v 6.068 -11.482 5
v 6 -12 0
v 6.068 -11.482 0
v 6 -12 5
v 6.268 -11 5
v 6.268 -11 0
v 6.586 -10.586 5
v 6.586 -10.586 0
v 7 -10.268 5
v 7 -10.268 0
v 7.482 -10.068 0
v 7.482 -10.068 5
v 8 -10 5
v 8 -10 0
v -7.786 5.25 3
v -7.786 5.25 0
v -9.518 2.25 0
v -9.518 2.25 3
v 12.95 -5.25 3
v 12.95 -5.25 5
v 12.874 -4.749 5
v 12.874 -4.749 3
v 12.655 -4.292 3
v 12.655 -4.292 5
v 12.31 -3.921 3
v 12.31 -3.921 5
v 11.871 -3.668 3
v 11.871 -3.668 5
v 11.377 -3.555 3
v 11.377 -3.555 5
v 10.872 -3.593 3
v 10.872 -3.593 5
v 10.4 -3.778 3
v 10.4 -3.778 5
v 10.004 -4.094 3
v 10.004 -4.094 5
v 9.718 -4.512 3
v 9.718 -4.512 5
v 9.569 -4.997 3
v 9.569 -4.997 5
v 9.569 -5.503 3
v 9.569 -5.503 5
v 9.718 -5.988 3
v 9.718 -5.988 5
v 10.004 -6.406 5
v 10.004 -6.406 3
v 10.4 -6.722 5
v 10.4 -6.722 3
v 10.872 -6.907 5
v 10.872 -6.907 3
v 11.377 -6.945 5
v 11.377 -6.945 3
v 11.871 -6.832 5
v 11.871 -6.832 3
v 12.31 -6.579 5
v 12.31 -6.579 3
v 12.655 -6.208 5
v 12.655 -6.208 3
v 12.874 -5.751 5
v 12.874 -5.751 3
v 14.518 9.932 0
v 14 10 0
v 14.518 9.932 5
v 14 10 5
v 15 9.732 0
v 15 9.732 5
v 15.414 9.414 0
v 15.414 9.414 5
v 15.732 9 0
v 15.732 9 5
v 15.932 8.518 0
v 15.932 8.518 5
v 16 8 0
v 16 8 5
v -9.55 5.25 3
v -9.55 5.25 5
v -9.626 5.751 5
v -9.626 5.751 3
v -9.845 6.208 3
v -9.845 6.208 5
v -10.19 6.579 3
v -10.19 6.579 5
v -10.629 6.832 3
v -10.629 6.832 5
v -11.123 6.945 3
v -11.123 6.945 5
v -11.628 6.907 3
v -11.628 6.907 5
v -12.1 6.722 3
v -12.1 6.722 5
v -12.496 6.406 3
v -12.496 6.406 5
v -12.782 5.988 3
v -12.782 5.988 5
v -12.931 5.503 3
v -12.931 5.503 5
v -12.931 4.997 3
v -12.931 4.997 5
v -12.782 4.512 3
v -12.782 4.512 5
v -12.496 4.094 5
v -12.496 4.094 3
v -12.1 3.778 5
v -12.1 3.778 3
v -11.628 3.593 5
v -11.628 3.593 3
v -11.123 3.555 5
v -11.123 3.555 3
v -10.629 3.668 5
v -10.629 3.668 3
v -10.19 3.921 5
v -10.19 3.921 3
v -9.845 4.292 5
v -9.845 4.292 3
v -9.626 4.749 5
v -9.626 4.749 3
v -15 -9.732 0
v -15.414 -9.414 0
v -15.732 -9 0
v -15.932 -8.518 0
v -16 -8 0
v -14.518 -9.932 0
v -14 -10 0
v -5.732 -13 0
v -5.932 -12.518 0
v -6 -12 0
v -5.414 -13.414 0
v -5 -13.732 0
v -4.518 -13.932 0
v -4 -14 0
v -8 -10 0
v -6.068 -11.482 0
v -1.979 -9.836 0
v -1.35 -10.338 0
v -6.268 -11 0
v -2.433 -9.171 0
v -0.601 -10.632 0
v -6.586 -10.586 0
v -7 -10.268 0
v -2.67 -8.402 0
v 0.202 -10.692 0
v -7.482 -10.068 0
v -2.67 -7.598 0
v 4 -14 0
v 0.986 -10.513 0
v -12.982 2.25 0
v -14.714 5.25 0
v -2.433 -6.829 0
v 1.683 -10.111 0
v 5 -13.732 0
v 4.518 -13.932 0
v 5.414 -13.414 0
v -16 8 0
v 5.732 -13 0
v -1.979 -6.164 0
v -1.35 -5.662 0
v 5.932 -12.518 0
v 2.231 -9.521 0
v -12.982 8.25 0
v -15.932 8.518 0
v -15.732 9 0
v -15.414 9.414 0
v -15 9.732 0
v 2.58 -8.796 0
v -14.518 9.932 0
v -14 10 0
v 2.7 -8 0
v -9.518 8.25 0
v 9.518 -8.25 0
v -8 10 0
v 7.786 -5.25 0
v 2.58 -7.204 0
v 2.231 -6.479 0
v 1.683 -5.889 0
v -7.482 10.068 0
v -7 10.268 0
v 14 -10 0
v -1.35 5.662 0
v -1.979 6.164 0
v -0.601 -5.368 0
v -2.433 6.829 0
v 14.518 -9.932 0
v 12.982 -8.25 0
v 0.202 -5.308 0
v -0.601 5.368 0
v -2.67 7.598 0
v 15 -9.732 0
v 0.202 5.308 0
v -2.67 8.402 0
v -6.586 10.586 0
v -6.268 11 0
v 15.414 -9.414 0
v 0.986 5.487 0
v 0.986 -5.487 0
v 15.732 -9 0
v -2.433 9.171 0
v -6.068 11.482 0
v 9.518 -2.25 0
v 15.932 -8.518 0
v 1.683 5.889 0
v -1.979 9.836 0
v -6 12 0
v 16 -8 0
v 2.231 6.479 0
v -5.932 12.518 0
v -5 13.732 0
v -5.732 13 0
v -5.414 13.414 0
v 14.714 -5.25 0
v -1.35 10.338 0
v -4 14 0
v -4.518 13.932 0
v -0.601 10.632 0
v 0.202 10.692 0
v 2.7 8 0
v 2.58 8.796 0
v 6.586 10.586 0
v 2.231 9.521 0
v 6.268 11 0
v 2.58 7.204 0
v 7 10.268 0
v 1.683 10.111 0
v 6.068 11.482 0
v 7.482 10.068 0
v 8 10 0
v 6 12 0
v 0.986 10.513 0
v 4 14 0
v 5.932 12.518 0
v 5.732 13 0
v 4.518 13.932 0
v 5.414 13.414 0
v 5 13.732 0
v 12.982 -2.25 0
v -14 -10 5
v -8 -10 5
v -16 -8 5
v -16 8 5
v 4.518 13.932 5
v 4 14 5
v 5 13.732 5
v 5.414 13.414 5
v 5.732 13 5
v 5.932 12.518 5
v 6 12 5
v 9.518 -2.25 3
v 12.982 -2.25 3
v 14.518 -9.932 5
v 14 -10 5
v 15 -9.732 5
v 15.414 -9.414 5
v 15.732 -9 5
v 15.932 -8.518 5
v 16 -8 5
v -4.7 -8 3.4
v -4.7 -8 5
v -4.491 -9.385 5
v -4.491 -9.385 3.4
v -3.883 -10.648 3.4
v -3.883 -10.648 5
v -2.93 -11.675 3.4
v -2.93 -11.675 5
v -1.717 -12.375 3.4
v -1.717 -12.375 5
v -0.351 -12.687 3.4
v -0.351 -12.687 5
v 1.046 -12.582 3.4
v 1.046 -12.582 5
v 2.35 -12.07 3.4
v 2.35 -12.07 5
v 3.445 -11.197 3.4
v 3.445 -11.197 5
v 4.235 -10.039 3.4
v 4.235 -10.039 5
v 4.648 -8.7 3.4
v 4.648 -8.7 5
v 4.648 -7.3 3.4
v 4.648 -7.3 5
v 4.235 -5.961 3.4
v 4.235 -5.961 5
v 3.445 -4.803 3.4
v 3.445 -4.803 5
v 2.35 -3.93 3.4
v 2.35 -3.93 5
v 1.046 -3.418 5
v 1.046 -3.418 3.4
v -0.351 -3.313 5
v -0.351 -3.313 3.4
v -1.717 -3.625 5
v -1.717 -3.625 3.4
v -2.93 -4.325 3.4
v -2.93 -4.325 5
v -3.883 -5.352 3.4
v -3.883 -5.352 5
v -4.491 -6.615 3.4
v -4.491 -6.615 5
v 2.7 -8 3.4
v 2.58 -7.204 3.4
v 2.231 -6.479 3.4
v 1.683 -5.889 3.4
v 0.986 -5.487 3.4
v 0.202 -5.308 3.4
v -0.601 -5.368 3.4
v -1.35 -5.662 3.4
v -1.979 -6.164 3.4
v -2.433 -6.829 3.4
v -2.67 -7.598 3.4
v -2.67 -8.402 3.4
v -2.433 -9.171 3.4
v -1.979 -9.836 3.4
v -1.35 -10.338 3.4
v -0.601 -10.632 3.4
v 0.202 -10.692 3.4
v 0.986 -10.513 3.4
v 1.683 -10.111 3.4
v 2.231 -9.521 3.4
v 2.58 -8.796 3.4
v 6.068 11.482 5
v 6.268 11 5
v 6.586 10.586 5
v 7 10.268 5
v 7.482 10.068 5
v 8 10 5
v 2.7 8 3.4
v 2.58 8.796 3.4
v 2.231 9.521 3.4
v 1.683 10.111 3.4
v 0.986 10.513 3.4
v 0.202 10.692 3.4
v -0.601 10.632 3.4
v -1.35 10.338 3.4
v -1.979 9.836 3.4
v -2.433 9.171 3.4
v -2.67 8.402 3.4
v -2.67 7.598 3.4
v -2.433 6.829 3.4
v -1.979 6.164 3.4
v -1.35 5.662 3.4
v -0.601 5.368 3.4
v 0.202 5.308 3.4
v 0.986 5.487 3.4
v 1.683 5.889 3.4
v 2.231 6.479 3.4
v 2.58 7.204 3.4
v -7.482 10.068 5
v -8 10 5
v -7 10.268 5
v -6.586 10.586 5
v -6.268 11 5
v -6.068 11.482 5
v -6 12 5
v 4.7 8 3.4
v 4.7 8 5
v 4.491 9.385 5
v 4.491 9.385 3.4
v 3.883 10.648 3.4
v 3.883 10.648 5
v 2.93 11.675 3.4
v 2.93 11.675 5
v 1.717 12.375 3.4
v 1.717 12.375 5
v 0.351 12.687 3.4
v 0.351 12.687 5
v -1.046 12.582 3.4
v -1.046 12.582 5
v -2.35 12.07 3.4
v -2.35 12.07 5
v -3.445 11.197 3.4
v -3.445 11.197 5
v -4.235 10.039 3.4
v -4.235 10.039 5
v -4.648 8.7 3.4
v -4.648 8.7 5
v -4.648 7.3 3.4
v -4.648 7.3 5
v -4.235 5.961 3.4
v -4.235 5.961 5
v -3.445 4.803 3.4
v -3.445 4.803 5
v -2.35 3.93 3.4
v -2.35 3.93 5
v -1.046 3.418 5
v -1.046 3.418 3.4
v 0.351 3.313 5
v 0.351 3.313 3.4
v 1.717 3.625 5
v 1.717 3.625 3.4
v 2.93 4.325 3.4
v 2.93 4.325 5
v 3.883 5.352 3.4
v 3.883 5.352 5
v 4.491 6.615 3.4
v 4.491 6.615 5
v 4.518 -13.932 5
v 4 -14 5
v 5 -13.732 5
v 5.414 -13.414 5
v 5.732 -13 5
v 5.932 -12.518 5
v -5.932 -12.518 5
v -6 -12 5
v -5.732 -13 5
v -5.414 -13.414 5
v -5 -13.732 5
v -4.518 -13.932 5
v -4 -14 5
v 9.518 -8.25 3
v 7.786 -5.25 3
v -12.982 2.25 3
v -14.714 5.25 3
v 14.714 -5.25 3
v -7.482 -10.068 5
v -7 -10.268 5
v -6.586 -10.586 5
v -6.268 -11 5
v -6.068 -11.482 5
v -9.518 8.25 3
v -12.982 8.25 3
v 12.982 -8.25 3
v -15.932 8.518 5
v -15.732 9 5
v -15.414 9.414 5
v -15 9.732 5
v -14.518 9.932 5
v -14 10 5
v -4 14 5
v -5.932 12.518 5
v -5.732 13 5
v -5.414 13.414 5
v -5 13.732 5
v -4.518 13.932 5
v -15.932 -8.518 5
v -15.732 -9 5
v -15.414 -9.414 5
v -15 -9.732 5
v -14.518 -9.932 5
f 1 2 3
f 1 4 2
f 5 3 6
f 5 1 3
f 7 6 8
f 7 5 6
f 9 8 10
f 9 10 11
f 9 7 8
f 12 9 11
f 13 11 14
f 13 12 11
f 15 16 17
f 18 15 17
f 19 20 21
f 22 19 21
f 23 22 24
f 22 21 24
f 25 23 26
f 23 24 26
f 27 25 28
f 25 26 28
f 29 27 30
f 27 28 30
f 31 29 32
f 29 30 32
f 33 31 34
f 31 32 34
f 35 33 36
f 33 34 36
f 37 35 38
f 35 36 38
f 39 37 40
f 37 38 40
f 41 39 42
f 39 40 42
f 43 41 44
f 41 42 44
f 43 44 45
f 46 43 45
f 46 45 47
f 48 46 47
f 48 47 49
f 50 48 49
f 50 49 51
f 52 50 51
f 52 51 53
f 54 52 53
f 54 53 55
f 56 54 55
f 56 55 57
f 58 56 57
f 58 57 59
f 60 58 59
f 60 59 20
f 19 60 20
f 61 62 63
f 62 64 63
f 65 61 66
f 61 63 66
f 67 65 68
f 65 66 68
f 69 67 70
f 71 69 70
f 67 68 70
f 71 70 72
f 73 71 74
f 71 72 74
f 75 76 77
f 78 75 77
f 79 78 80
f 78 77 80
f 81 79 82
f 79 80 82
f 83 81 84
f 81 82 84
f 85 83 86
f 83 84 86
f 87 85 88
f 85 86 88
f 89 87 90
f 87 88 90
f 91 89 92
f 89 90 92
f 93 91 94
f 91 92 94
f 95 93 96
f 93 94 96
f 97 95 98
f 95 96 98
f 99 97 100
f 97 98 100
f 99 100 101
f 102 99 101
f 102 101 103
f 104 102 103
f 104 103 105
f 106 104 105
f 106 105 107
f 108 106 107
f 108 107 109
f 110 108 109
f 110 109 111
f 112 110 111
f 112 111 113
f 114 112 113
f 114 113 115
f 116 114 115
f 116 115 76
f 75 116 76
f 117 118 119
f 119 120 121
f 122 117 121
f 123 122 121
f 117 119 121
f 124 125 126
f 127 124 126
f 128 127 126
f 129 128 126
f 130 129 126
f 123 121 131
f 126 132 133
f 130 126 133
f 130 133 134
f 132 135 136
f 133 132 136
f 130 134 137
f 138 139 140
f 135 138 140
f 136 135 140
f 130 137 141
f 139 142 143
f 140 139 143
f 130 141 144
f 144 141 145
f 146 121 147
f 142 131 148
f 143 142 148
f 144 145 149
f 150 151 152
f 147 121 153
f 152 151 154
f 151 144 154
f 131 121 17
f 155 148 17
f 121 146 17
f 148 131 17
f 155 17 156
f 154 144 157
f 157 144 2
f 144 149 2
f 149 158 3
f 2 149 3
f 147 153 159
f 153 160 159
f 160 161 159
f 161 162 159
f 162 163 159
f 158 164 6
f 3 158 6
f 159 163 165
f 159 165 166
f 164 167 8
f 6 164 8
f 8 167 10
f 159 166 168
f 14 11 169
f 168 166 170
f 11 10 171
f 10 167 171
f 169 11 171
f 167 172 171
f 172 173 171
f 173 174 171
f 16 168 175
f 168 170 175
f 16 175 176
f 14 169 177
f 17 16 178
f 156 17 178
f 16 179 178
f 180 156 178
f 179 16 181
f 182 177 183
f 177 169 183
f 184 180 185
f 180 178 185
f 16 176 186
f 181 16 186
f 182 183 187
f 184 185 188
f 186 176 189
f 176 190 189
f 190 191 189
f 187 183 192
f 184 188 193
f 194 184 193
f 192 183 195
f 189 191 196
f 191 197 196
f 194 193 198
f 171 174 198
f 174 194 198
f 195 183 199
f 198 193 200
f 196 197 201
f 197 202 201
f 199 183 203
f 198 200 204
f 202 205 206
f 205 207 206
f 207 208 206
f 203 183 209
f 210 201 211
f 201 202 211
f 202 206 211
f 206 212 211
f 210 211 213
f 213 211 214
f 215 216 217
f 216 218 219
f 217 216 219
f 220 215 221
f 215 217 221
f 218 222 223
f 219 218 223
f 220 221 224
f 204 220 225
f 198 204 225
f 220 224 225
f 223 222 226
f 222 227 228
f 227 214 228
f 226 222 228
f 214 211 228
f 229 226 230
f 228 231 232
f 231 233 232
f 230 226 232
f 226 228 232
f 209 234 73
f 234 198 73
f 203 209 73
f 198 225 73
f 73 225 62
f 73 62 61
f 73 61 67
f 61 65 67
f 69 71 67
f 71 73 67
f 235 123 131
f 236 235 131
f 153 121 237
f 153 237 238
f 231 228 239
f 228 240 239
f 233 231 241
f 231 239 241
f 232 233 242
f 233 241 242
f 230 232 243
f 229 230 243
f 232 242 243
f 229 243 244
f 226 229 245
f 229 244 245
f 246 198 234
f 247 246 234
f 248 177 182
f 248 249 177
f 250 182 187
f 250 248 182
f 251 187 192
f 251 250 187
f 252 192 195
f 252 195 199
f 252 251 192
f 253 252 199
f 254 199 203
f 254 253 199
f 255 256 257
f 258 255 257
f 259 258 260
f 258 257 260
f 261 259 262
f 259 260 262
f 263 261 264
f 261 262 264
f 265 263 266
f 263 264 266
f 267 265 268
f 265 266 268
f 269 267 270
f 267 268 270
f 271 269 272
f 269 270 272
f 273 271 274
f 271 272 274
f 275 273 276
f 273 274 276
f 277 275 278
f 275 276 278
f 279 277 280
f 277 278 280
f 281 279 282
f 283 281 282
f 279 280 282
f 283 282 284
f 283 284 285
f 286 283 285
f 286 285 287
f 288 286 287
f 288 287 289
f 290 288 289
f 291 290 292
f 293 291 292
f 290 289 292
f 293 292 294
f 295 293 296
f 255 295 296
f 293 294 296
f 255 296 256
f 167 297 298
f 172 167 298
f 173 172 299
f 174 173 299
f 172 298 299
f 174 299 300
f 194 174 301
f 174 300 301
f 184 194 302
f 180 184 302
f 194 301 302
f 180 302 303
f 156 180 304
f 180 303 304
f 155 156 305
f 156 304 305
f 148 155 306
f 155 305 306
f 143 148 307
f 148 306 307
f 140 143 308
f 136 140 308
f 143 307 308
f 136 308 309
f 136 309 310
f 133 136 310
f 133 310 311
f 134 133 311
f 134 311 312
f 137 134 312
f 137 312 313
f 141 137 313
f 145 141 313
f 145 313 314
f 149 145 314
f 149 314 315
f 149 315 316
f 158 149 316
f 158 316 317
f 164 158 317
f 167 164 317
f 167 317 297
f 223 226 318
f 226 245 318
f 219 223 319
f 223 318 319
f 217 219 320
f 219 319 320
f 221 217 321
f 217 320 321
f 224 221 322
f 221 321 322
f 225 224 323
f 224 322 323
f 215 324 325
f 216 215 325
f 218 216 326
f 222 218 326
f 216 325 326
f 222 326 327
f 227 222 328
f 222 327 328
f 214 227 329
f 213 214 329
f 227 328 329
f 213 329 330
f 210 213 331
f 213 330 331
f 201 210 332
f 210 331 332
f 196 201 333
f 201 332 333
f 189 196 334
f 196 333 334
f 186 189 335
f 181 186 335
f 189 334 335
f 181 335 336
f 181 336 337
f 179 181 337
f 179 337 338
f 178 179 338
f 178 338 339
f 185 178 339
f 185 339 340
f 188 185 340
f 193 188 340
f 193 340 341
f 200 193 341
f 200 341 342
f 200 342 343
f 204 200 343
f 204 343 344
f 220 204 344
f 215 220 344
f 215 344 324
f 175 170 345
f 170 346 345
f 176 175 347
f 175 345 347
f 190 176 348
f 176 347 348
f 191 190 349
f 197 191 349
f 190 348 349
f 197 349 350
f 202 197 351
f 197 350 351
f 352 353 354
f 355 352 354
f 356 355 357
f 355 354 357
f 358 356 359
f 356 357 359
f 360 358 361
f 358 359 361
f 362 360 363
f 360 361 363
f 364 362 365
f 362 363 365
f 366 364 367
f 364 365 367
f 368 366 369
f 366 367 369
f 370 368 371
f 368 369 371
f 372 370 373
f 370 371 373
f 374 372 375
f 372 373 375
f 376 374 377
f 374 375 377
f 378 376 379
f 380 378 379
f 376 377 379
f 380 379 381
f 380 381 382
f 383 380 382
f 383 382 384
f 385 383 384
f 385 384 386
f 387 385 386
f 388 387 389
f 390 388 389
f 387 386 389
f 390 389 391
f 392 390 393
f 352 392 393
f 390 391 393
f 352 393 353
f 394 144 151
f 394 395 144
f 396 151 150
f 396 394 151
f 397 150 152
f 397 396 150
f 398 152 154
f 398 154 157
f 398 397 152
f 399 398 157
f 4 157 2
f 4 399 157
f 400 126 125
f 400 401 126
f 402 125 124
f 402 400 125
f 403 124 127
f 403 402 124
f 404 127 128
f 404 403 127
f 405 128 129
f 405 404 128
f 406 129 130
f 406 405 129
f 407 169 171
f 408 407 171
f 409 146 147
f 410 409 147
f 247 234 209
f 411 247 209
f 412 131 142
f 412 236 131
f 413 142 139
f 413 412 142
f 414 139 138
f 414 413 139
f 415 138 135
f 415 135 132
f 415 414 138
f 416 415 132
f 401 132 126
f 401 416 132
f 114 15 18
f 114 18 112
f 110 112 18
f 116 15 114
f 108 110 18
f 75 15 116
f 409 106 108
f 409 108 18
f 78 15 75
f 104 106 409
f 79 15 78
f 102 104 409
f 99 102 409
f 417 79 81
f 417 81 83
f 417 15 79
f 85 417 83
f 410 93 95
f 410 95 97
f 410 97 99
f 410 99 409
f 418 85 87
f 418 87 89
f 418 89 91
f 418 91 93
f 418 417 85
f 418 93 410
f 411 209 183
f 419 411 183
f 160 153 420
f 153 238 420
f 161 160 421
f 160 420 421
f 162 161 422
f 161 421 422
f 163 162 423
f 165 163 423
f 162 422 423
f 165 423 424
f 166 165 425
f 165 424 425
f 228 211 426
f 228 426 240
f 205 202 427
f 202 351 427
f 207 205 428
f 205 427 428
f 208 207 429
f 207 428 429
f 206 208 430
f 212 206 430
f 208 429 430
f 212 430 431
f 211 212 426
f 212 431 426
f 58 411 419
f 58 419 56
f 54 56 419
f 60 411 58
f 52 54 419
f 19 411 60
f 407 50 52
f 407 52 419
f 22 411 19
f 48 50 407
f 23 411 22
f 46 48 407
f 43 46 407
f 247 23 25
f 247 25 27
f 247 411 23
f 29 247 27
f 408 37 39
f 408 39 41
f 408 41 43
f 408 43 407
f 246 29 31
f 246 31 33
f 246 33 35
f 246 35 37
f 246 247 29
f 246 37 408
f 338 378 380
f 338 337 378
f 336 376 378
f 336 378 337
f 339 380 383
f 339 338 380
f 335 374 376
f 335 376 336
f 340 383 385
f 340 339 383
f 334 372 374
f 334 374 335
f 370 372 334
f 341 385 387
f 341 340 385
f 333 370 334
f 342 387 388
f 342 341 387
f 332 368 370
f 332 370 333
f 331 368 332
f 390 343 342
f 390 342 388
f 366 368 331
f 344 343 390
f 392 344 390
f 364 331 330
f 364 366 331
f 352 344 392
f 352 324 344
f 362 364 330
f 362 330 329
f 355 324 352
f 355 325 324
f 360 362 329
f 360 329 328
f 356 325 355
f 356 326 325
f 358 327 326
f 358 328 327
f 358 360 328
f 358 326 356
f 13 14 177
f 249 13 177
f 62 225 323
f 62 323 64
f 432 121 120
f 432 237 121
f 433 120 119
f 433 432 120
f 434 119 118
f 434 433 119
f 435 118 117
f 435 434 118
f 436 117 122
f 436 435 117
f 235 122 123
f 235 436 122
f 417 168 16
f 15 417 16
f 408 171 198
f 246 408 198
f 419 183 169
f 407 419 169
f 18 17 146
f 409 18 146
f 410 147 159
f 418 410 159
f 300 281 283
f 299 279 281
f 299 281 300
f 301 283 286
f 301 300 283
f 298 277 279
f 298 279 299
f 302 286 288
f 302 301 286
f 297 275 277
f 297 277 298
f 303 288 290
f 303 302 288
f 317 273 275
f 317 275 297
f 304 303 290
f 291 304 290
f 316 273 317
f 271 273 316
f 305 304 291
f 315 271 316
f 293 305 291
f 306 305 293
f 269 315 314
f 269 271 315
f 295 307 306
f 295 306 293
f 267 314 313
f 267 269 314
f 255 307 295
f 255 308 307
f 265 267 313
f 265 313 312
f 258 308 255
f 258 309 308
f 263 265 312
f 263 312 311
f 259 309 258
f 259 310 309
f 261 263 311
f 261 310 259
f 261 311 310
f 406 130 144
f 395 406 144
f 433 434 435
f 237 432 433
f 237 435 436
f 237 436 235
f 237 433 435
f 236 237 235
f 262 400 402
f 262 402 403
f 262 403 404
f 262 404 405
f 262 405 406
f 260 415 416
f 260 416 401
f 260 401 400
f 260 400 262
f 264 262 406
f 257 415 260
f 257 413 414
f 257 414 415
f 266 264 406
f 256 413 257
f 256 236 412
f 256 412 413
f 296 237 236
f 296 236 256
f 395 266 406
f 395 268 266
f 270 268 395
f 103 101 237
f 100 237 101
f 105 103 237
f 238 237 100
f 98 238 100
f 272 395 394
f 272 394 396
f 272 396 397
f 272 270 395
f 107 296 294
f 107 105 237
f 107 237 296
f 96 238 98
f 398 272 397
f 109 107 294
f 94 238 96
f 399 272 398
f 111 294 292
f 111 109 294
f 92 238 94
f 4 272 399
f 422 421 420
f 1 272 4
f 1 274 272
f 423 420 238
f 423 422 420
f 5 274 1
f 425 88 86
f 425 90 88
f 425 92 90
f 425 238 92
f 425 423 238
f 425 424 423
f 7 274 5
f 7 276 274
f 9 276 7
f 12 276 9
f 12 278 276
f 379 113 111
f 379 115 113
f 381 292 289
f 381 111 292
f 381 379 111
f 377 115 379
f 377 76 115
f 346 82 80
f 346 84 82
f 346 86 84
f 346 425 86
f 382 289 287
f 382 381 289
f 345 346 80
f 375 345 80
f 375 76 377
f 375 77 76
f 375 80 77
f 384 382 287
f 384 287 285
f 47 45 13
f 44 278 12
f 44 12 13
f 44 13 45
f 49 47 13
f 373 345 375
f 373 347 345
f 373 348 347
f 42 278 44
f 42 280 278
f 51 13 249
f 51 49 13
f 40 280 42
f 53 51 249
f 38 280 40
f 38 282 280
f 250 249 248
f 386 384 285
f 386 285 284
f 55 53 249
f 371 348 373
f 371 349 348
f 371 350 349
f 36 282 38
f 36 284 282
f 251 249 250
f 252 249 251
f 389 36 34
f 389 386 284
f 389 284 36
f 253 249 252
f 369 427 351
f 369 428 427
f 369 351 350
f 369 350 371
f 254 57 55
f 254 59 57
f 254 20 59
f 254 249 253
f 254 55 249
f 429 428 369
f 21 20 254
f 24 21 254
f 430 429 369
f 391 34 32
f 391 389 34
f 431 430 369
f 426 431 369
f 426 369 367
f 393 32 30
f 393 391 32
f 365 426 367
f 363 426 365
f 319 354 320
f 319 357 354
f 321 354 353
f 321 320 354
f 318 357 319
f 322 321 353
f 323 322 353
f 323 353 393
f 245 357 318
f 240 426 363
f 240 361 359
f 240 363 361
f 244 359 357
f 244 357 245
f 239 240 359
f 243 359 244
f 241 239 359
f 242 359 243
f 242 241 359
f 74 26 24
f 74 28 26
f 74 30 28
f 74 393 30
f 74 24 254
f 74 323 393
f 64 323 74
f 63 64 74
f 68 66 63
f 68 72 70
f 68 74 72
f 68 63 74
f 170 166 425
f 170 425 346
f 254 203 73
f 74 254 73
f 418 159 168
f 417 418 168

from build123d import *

# Parameters (mm, degrees)
SCHIZZO1_W                   = 32
SCHIZZO1_H                   = 20
ESTRUSIONE_ESTRUSIONE1_DEPTH = 5
SCHIZZO2_R                   = 1.7
TAGLIO_ESTRUSIONE1_DEPTH     = 20.519221296
SCHIZZO3_W                   = 12
SCHIZZO3_H                   = 4
ESTRUSIONE_ESTRUSIONE2_DEPTH = 5
SCHIZZO4_R                   = 4.7
TAGLIO_ESTRUSIONE2_DEPTH     = 1.6
SCHIZZO5_R                   = 2.7
TAGLIO_ESTRUSIONE3_DEPTH     = 22.530443563
TAGLIO_ESTRUSIONE4_DEPTH     = 3
RACCORDO1_R                  = 2


with BuildPart() as part:
    # Schizzo1 → Estrusione-Estrusione1 (new body)
    with BuildSketch(Plane.XY):
        Rectangle(SCHIZZO1_W, SCHIZZO1_H)
    extrude(amount=ESTRUSIONE_ESTRUSIONE1_DEPTH)

    # Schizzo2 → Taglio-Estrusione1 (cut, through all)
    with BuildSketch(Plane.XY.offset(5)):
        with Locations((-11.25, 5.25)):
            Circle(SCHIZZO2_R)
        with Locations((11.25, -5.25)):
            Circle(SCHIZZO2_R)
    extrude(amount=-TAGLIO_ESTRUSIONE1_DEPTH, mode=Mode.SUBTRACT)

    # Schizzo3 → Estrusione-Estrusione2 (add)
    with BuildSketch(Plane.XY):
        with Locations((0, 12)):
            Rectangle(SCHIZZO3_W, SCHIZZO3_H)
        with Locations((0, -12)):
            Rectangle(SCHIZZO3_W, SCHIZZO3_H)
    extrude(amount=ESTRUSIONE_ESTRUSIONE2_DEPTH)

    # Schizzo4 → Taglio-Estrusione2 (cut)
    with BuildSketch(Plane.XY.offset(5)):
        with Locations((0, 8)):
            Circle(SCHIZZO4_R)
        with Locations(Location((0, -8, 0), (0, 0, 180))):
            Circle(SCHIZZO4_R)
    extrude(amount=-TAGLIO_ESTRUSIONE2_DEPTH, mode=Mode.SUBTRACT)

    # Schizzo5 → Taglio-Estrusione3 (cut, through all)
    with BuildSketch(Plane.XY.offset(3.4)):
        with Locations((0, 8)):
            Circle(SCHIZZO5_R)
        with Locations((0, -8)):
            Circle(SCHIZZO5_R)
    extrude(amount=-TAGLIO_ESTRUSIONE3_DEPTH, mode=Mode.SUBTRACT)

    # Schizzo6 → Taglio-Estrusione4 (cut)
    with BuildSketch(Plane(origin=(0, 0, 0), x_dir=(-1, 0, 0), z_dir=(0, 0, -1))):
        Polygon((7.785898385, 5.25), (9.517949192, 2.25), (12.982050808, 2.25), (14.714101615, 5.25), (12.982050808, 8.25), (9.517949192, 8.25), align=None)
        Polygon((-14.714101615, -5.25), (-12.982050808, -8.25), (-9.517949192, -8.25), (-7.785898385, -5.25), (-9.517949192, -2.25), (-12.982050808, -2.25), align=None)
    extrude(amount=-TAGLIO_ESTRUSIONE4_DEPTH, mode=Mode.SUBTRACT)

    # Raccordo1
    raccordo1_edges = [part.edges().sort_by_distance(p)[0] for p in [
        (16, 10, 2.5),
        (16, -10, 2.5),
        (6, -10, 2.5),
        (6, -14, 2.5),
        (-6, -14, 2.5),
        (-6, -10, 2.5),
        (-16, -10, 2.5),
        (-16, 10, 2.5),
        (6, 14, 2.5),
        (-6, 14, 2.5),
        (-6, 10, 2.5),
        (6, 10, 2.5),
    ]]
    fillet(raccordo1_edges, radius=RACCORDO1_R - 0.0001)  # a hair under: the kernel refuses the full size


solid = part.part
